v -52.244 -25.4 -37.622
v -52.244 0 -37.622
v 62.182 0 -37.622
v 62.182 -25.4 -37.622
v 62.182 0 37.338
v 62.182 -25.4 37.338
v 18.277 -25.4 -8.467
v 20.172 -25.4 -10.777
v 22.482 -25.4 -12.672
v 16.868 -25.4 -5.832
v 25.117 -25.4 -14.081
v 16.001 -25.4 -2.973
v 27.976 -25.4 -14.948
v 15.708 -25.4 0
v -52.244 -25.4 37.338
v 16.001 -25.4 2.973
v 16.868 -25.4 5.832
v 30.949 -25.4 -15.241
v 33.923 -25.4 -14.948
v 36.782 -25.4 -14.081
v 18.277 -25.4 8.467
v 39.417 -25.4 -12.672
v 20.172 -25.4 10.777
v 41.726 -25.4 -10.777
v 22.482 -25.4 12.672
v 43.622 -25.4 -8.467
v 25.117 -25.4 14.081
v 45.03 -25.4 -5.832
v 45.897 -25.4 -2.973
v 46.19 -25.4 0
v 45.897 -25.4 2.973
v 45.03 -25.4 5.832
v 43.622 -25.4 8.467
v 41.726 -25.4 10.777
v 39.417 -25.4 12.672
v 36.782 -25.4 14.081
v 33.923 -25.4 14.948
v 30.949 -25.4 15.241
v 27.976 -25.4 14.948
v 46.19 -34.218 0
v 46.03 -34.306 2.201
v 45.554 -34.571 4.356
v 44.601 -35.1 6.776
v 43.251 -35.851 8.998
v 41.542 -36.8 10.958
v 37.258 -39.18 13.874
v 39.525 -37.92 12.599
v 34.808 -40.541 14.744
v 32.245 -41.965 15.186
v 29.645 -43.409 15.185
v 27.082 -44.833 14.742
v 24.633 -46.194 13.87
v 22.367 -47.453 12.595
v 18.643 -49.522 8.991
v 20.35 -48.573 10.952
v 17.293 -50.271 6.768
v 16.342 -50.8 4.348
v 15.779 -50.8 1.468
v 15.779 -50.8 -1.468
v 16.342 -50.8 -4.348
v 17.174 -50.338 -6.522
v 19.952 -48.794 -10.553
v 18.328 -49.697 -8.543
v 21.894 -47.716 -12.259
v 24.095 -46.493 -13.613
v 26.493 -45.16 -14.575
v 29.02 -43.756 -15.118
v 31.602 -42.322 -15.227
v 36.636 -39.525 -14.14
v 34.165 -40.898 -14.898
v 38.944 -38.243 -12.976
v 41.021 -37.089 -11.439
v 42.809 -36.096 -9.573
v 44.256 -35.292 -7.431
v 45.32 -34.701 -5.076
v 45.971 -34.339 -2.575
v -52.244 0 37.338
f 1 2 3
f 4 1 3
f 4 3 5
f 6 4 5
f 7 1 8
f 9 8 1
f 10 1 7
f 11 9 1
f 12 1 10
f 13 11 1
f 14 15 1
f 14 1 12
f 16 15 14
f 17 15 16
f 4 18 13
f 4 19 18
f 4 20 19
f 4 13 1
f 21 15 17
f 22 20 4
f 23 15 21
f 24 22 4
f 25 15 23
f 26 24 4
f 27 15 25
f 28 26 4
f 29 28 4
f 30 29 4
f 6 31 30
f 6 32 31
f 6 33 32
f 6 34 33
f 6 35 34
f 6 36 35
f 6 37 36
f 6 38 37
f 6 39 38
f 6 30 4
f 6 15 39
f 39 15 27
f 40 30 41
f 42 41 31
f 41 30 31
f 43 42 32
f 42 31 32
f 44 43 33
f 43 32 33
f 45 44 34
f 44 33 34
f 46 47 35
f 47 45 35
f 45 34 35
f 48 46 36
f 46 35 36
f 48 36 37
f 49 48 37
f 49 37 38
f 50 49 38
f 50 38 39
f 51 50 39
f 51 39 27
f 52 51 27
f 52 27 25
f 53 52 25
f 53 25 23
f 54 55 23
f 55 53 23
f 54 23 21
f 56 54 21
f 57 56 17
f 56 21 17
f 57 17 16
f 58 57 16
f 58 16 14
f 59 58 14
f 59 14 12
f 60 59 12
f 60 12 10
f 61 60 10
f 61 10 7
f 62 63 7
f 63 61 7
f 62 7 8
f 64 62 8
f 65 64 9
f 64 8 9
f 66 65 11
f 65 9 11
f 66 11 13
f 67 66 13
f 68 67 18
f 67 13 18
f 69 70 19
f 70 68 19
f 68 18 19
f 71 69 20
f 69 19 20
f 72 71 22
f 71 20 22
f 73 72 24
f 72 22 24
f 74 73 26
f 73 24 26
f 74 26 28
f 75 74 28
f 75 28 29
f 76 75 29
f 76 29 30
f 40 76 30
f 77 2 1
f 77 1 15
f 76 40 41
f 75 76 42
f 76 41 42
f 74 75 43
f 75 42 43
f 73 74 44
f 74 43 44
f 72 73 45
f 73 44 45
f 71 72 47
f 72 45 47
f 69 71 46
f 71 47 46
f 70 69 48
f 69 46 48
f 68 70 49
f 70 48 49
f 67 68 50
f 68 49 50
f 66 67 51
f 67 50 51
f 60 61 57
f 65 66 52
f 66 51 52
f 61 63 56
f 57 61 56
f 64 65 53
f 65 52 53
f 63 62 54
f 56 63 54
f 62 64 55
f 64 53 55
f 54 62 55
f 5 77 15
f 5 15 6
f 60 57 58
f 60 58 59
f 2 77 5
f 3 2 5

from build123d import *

# Parameters (mm, degrees)
F0_W     = 114.426647
F0_H     = 74.959393
F1_DEPTH = 25.4
F2_R     = 15.240971
F3_DEPTH = 25.4
F5_DEPTH = 25.4


with BuildPart() as f1:
    # F0 (on Front) → F1 (new body)
    with BuildSketch(Plane.XZ):
        with Locations((4.968898, -0.141972)):
            Rectangle(F0_W, F0_H)
    extrude(amount=F1_DEPTH)

    # F2 (on face) → F3 (join)
    with BuildSketch(Plane.XZ.offset(25.4)):
        with Locations((30.949144, 0)):
            Circle(F2_R)
    extrude(amount=F3_DEPTH)

    # F4 (on Top) → F5 (cut, symmetric)
    with BuildSketch(Plane.XY):
        Polygon((50.745651, -52.68006), (46.725634, -33.919994), (12.957521, -52.68006), align=None)
    extrude(amount=F5_DEPTH, both=True, mode=Mode.SUBTRACT)


solid = f1.part
